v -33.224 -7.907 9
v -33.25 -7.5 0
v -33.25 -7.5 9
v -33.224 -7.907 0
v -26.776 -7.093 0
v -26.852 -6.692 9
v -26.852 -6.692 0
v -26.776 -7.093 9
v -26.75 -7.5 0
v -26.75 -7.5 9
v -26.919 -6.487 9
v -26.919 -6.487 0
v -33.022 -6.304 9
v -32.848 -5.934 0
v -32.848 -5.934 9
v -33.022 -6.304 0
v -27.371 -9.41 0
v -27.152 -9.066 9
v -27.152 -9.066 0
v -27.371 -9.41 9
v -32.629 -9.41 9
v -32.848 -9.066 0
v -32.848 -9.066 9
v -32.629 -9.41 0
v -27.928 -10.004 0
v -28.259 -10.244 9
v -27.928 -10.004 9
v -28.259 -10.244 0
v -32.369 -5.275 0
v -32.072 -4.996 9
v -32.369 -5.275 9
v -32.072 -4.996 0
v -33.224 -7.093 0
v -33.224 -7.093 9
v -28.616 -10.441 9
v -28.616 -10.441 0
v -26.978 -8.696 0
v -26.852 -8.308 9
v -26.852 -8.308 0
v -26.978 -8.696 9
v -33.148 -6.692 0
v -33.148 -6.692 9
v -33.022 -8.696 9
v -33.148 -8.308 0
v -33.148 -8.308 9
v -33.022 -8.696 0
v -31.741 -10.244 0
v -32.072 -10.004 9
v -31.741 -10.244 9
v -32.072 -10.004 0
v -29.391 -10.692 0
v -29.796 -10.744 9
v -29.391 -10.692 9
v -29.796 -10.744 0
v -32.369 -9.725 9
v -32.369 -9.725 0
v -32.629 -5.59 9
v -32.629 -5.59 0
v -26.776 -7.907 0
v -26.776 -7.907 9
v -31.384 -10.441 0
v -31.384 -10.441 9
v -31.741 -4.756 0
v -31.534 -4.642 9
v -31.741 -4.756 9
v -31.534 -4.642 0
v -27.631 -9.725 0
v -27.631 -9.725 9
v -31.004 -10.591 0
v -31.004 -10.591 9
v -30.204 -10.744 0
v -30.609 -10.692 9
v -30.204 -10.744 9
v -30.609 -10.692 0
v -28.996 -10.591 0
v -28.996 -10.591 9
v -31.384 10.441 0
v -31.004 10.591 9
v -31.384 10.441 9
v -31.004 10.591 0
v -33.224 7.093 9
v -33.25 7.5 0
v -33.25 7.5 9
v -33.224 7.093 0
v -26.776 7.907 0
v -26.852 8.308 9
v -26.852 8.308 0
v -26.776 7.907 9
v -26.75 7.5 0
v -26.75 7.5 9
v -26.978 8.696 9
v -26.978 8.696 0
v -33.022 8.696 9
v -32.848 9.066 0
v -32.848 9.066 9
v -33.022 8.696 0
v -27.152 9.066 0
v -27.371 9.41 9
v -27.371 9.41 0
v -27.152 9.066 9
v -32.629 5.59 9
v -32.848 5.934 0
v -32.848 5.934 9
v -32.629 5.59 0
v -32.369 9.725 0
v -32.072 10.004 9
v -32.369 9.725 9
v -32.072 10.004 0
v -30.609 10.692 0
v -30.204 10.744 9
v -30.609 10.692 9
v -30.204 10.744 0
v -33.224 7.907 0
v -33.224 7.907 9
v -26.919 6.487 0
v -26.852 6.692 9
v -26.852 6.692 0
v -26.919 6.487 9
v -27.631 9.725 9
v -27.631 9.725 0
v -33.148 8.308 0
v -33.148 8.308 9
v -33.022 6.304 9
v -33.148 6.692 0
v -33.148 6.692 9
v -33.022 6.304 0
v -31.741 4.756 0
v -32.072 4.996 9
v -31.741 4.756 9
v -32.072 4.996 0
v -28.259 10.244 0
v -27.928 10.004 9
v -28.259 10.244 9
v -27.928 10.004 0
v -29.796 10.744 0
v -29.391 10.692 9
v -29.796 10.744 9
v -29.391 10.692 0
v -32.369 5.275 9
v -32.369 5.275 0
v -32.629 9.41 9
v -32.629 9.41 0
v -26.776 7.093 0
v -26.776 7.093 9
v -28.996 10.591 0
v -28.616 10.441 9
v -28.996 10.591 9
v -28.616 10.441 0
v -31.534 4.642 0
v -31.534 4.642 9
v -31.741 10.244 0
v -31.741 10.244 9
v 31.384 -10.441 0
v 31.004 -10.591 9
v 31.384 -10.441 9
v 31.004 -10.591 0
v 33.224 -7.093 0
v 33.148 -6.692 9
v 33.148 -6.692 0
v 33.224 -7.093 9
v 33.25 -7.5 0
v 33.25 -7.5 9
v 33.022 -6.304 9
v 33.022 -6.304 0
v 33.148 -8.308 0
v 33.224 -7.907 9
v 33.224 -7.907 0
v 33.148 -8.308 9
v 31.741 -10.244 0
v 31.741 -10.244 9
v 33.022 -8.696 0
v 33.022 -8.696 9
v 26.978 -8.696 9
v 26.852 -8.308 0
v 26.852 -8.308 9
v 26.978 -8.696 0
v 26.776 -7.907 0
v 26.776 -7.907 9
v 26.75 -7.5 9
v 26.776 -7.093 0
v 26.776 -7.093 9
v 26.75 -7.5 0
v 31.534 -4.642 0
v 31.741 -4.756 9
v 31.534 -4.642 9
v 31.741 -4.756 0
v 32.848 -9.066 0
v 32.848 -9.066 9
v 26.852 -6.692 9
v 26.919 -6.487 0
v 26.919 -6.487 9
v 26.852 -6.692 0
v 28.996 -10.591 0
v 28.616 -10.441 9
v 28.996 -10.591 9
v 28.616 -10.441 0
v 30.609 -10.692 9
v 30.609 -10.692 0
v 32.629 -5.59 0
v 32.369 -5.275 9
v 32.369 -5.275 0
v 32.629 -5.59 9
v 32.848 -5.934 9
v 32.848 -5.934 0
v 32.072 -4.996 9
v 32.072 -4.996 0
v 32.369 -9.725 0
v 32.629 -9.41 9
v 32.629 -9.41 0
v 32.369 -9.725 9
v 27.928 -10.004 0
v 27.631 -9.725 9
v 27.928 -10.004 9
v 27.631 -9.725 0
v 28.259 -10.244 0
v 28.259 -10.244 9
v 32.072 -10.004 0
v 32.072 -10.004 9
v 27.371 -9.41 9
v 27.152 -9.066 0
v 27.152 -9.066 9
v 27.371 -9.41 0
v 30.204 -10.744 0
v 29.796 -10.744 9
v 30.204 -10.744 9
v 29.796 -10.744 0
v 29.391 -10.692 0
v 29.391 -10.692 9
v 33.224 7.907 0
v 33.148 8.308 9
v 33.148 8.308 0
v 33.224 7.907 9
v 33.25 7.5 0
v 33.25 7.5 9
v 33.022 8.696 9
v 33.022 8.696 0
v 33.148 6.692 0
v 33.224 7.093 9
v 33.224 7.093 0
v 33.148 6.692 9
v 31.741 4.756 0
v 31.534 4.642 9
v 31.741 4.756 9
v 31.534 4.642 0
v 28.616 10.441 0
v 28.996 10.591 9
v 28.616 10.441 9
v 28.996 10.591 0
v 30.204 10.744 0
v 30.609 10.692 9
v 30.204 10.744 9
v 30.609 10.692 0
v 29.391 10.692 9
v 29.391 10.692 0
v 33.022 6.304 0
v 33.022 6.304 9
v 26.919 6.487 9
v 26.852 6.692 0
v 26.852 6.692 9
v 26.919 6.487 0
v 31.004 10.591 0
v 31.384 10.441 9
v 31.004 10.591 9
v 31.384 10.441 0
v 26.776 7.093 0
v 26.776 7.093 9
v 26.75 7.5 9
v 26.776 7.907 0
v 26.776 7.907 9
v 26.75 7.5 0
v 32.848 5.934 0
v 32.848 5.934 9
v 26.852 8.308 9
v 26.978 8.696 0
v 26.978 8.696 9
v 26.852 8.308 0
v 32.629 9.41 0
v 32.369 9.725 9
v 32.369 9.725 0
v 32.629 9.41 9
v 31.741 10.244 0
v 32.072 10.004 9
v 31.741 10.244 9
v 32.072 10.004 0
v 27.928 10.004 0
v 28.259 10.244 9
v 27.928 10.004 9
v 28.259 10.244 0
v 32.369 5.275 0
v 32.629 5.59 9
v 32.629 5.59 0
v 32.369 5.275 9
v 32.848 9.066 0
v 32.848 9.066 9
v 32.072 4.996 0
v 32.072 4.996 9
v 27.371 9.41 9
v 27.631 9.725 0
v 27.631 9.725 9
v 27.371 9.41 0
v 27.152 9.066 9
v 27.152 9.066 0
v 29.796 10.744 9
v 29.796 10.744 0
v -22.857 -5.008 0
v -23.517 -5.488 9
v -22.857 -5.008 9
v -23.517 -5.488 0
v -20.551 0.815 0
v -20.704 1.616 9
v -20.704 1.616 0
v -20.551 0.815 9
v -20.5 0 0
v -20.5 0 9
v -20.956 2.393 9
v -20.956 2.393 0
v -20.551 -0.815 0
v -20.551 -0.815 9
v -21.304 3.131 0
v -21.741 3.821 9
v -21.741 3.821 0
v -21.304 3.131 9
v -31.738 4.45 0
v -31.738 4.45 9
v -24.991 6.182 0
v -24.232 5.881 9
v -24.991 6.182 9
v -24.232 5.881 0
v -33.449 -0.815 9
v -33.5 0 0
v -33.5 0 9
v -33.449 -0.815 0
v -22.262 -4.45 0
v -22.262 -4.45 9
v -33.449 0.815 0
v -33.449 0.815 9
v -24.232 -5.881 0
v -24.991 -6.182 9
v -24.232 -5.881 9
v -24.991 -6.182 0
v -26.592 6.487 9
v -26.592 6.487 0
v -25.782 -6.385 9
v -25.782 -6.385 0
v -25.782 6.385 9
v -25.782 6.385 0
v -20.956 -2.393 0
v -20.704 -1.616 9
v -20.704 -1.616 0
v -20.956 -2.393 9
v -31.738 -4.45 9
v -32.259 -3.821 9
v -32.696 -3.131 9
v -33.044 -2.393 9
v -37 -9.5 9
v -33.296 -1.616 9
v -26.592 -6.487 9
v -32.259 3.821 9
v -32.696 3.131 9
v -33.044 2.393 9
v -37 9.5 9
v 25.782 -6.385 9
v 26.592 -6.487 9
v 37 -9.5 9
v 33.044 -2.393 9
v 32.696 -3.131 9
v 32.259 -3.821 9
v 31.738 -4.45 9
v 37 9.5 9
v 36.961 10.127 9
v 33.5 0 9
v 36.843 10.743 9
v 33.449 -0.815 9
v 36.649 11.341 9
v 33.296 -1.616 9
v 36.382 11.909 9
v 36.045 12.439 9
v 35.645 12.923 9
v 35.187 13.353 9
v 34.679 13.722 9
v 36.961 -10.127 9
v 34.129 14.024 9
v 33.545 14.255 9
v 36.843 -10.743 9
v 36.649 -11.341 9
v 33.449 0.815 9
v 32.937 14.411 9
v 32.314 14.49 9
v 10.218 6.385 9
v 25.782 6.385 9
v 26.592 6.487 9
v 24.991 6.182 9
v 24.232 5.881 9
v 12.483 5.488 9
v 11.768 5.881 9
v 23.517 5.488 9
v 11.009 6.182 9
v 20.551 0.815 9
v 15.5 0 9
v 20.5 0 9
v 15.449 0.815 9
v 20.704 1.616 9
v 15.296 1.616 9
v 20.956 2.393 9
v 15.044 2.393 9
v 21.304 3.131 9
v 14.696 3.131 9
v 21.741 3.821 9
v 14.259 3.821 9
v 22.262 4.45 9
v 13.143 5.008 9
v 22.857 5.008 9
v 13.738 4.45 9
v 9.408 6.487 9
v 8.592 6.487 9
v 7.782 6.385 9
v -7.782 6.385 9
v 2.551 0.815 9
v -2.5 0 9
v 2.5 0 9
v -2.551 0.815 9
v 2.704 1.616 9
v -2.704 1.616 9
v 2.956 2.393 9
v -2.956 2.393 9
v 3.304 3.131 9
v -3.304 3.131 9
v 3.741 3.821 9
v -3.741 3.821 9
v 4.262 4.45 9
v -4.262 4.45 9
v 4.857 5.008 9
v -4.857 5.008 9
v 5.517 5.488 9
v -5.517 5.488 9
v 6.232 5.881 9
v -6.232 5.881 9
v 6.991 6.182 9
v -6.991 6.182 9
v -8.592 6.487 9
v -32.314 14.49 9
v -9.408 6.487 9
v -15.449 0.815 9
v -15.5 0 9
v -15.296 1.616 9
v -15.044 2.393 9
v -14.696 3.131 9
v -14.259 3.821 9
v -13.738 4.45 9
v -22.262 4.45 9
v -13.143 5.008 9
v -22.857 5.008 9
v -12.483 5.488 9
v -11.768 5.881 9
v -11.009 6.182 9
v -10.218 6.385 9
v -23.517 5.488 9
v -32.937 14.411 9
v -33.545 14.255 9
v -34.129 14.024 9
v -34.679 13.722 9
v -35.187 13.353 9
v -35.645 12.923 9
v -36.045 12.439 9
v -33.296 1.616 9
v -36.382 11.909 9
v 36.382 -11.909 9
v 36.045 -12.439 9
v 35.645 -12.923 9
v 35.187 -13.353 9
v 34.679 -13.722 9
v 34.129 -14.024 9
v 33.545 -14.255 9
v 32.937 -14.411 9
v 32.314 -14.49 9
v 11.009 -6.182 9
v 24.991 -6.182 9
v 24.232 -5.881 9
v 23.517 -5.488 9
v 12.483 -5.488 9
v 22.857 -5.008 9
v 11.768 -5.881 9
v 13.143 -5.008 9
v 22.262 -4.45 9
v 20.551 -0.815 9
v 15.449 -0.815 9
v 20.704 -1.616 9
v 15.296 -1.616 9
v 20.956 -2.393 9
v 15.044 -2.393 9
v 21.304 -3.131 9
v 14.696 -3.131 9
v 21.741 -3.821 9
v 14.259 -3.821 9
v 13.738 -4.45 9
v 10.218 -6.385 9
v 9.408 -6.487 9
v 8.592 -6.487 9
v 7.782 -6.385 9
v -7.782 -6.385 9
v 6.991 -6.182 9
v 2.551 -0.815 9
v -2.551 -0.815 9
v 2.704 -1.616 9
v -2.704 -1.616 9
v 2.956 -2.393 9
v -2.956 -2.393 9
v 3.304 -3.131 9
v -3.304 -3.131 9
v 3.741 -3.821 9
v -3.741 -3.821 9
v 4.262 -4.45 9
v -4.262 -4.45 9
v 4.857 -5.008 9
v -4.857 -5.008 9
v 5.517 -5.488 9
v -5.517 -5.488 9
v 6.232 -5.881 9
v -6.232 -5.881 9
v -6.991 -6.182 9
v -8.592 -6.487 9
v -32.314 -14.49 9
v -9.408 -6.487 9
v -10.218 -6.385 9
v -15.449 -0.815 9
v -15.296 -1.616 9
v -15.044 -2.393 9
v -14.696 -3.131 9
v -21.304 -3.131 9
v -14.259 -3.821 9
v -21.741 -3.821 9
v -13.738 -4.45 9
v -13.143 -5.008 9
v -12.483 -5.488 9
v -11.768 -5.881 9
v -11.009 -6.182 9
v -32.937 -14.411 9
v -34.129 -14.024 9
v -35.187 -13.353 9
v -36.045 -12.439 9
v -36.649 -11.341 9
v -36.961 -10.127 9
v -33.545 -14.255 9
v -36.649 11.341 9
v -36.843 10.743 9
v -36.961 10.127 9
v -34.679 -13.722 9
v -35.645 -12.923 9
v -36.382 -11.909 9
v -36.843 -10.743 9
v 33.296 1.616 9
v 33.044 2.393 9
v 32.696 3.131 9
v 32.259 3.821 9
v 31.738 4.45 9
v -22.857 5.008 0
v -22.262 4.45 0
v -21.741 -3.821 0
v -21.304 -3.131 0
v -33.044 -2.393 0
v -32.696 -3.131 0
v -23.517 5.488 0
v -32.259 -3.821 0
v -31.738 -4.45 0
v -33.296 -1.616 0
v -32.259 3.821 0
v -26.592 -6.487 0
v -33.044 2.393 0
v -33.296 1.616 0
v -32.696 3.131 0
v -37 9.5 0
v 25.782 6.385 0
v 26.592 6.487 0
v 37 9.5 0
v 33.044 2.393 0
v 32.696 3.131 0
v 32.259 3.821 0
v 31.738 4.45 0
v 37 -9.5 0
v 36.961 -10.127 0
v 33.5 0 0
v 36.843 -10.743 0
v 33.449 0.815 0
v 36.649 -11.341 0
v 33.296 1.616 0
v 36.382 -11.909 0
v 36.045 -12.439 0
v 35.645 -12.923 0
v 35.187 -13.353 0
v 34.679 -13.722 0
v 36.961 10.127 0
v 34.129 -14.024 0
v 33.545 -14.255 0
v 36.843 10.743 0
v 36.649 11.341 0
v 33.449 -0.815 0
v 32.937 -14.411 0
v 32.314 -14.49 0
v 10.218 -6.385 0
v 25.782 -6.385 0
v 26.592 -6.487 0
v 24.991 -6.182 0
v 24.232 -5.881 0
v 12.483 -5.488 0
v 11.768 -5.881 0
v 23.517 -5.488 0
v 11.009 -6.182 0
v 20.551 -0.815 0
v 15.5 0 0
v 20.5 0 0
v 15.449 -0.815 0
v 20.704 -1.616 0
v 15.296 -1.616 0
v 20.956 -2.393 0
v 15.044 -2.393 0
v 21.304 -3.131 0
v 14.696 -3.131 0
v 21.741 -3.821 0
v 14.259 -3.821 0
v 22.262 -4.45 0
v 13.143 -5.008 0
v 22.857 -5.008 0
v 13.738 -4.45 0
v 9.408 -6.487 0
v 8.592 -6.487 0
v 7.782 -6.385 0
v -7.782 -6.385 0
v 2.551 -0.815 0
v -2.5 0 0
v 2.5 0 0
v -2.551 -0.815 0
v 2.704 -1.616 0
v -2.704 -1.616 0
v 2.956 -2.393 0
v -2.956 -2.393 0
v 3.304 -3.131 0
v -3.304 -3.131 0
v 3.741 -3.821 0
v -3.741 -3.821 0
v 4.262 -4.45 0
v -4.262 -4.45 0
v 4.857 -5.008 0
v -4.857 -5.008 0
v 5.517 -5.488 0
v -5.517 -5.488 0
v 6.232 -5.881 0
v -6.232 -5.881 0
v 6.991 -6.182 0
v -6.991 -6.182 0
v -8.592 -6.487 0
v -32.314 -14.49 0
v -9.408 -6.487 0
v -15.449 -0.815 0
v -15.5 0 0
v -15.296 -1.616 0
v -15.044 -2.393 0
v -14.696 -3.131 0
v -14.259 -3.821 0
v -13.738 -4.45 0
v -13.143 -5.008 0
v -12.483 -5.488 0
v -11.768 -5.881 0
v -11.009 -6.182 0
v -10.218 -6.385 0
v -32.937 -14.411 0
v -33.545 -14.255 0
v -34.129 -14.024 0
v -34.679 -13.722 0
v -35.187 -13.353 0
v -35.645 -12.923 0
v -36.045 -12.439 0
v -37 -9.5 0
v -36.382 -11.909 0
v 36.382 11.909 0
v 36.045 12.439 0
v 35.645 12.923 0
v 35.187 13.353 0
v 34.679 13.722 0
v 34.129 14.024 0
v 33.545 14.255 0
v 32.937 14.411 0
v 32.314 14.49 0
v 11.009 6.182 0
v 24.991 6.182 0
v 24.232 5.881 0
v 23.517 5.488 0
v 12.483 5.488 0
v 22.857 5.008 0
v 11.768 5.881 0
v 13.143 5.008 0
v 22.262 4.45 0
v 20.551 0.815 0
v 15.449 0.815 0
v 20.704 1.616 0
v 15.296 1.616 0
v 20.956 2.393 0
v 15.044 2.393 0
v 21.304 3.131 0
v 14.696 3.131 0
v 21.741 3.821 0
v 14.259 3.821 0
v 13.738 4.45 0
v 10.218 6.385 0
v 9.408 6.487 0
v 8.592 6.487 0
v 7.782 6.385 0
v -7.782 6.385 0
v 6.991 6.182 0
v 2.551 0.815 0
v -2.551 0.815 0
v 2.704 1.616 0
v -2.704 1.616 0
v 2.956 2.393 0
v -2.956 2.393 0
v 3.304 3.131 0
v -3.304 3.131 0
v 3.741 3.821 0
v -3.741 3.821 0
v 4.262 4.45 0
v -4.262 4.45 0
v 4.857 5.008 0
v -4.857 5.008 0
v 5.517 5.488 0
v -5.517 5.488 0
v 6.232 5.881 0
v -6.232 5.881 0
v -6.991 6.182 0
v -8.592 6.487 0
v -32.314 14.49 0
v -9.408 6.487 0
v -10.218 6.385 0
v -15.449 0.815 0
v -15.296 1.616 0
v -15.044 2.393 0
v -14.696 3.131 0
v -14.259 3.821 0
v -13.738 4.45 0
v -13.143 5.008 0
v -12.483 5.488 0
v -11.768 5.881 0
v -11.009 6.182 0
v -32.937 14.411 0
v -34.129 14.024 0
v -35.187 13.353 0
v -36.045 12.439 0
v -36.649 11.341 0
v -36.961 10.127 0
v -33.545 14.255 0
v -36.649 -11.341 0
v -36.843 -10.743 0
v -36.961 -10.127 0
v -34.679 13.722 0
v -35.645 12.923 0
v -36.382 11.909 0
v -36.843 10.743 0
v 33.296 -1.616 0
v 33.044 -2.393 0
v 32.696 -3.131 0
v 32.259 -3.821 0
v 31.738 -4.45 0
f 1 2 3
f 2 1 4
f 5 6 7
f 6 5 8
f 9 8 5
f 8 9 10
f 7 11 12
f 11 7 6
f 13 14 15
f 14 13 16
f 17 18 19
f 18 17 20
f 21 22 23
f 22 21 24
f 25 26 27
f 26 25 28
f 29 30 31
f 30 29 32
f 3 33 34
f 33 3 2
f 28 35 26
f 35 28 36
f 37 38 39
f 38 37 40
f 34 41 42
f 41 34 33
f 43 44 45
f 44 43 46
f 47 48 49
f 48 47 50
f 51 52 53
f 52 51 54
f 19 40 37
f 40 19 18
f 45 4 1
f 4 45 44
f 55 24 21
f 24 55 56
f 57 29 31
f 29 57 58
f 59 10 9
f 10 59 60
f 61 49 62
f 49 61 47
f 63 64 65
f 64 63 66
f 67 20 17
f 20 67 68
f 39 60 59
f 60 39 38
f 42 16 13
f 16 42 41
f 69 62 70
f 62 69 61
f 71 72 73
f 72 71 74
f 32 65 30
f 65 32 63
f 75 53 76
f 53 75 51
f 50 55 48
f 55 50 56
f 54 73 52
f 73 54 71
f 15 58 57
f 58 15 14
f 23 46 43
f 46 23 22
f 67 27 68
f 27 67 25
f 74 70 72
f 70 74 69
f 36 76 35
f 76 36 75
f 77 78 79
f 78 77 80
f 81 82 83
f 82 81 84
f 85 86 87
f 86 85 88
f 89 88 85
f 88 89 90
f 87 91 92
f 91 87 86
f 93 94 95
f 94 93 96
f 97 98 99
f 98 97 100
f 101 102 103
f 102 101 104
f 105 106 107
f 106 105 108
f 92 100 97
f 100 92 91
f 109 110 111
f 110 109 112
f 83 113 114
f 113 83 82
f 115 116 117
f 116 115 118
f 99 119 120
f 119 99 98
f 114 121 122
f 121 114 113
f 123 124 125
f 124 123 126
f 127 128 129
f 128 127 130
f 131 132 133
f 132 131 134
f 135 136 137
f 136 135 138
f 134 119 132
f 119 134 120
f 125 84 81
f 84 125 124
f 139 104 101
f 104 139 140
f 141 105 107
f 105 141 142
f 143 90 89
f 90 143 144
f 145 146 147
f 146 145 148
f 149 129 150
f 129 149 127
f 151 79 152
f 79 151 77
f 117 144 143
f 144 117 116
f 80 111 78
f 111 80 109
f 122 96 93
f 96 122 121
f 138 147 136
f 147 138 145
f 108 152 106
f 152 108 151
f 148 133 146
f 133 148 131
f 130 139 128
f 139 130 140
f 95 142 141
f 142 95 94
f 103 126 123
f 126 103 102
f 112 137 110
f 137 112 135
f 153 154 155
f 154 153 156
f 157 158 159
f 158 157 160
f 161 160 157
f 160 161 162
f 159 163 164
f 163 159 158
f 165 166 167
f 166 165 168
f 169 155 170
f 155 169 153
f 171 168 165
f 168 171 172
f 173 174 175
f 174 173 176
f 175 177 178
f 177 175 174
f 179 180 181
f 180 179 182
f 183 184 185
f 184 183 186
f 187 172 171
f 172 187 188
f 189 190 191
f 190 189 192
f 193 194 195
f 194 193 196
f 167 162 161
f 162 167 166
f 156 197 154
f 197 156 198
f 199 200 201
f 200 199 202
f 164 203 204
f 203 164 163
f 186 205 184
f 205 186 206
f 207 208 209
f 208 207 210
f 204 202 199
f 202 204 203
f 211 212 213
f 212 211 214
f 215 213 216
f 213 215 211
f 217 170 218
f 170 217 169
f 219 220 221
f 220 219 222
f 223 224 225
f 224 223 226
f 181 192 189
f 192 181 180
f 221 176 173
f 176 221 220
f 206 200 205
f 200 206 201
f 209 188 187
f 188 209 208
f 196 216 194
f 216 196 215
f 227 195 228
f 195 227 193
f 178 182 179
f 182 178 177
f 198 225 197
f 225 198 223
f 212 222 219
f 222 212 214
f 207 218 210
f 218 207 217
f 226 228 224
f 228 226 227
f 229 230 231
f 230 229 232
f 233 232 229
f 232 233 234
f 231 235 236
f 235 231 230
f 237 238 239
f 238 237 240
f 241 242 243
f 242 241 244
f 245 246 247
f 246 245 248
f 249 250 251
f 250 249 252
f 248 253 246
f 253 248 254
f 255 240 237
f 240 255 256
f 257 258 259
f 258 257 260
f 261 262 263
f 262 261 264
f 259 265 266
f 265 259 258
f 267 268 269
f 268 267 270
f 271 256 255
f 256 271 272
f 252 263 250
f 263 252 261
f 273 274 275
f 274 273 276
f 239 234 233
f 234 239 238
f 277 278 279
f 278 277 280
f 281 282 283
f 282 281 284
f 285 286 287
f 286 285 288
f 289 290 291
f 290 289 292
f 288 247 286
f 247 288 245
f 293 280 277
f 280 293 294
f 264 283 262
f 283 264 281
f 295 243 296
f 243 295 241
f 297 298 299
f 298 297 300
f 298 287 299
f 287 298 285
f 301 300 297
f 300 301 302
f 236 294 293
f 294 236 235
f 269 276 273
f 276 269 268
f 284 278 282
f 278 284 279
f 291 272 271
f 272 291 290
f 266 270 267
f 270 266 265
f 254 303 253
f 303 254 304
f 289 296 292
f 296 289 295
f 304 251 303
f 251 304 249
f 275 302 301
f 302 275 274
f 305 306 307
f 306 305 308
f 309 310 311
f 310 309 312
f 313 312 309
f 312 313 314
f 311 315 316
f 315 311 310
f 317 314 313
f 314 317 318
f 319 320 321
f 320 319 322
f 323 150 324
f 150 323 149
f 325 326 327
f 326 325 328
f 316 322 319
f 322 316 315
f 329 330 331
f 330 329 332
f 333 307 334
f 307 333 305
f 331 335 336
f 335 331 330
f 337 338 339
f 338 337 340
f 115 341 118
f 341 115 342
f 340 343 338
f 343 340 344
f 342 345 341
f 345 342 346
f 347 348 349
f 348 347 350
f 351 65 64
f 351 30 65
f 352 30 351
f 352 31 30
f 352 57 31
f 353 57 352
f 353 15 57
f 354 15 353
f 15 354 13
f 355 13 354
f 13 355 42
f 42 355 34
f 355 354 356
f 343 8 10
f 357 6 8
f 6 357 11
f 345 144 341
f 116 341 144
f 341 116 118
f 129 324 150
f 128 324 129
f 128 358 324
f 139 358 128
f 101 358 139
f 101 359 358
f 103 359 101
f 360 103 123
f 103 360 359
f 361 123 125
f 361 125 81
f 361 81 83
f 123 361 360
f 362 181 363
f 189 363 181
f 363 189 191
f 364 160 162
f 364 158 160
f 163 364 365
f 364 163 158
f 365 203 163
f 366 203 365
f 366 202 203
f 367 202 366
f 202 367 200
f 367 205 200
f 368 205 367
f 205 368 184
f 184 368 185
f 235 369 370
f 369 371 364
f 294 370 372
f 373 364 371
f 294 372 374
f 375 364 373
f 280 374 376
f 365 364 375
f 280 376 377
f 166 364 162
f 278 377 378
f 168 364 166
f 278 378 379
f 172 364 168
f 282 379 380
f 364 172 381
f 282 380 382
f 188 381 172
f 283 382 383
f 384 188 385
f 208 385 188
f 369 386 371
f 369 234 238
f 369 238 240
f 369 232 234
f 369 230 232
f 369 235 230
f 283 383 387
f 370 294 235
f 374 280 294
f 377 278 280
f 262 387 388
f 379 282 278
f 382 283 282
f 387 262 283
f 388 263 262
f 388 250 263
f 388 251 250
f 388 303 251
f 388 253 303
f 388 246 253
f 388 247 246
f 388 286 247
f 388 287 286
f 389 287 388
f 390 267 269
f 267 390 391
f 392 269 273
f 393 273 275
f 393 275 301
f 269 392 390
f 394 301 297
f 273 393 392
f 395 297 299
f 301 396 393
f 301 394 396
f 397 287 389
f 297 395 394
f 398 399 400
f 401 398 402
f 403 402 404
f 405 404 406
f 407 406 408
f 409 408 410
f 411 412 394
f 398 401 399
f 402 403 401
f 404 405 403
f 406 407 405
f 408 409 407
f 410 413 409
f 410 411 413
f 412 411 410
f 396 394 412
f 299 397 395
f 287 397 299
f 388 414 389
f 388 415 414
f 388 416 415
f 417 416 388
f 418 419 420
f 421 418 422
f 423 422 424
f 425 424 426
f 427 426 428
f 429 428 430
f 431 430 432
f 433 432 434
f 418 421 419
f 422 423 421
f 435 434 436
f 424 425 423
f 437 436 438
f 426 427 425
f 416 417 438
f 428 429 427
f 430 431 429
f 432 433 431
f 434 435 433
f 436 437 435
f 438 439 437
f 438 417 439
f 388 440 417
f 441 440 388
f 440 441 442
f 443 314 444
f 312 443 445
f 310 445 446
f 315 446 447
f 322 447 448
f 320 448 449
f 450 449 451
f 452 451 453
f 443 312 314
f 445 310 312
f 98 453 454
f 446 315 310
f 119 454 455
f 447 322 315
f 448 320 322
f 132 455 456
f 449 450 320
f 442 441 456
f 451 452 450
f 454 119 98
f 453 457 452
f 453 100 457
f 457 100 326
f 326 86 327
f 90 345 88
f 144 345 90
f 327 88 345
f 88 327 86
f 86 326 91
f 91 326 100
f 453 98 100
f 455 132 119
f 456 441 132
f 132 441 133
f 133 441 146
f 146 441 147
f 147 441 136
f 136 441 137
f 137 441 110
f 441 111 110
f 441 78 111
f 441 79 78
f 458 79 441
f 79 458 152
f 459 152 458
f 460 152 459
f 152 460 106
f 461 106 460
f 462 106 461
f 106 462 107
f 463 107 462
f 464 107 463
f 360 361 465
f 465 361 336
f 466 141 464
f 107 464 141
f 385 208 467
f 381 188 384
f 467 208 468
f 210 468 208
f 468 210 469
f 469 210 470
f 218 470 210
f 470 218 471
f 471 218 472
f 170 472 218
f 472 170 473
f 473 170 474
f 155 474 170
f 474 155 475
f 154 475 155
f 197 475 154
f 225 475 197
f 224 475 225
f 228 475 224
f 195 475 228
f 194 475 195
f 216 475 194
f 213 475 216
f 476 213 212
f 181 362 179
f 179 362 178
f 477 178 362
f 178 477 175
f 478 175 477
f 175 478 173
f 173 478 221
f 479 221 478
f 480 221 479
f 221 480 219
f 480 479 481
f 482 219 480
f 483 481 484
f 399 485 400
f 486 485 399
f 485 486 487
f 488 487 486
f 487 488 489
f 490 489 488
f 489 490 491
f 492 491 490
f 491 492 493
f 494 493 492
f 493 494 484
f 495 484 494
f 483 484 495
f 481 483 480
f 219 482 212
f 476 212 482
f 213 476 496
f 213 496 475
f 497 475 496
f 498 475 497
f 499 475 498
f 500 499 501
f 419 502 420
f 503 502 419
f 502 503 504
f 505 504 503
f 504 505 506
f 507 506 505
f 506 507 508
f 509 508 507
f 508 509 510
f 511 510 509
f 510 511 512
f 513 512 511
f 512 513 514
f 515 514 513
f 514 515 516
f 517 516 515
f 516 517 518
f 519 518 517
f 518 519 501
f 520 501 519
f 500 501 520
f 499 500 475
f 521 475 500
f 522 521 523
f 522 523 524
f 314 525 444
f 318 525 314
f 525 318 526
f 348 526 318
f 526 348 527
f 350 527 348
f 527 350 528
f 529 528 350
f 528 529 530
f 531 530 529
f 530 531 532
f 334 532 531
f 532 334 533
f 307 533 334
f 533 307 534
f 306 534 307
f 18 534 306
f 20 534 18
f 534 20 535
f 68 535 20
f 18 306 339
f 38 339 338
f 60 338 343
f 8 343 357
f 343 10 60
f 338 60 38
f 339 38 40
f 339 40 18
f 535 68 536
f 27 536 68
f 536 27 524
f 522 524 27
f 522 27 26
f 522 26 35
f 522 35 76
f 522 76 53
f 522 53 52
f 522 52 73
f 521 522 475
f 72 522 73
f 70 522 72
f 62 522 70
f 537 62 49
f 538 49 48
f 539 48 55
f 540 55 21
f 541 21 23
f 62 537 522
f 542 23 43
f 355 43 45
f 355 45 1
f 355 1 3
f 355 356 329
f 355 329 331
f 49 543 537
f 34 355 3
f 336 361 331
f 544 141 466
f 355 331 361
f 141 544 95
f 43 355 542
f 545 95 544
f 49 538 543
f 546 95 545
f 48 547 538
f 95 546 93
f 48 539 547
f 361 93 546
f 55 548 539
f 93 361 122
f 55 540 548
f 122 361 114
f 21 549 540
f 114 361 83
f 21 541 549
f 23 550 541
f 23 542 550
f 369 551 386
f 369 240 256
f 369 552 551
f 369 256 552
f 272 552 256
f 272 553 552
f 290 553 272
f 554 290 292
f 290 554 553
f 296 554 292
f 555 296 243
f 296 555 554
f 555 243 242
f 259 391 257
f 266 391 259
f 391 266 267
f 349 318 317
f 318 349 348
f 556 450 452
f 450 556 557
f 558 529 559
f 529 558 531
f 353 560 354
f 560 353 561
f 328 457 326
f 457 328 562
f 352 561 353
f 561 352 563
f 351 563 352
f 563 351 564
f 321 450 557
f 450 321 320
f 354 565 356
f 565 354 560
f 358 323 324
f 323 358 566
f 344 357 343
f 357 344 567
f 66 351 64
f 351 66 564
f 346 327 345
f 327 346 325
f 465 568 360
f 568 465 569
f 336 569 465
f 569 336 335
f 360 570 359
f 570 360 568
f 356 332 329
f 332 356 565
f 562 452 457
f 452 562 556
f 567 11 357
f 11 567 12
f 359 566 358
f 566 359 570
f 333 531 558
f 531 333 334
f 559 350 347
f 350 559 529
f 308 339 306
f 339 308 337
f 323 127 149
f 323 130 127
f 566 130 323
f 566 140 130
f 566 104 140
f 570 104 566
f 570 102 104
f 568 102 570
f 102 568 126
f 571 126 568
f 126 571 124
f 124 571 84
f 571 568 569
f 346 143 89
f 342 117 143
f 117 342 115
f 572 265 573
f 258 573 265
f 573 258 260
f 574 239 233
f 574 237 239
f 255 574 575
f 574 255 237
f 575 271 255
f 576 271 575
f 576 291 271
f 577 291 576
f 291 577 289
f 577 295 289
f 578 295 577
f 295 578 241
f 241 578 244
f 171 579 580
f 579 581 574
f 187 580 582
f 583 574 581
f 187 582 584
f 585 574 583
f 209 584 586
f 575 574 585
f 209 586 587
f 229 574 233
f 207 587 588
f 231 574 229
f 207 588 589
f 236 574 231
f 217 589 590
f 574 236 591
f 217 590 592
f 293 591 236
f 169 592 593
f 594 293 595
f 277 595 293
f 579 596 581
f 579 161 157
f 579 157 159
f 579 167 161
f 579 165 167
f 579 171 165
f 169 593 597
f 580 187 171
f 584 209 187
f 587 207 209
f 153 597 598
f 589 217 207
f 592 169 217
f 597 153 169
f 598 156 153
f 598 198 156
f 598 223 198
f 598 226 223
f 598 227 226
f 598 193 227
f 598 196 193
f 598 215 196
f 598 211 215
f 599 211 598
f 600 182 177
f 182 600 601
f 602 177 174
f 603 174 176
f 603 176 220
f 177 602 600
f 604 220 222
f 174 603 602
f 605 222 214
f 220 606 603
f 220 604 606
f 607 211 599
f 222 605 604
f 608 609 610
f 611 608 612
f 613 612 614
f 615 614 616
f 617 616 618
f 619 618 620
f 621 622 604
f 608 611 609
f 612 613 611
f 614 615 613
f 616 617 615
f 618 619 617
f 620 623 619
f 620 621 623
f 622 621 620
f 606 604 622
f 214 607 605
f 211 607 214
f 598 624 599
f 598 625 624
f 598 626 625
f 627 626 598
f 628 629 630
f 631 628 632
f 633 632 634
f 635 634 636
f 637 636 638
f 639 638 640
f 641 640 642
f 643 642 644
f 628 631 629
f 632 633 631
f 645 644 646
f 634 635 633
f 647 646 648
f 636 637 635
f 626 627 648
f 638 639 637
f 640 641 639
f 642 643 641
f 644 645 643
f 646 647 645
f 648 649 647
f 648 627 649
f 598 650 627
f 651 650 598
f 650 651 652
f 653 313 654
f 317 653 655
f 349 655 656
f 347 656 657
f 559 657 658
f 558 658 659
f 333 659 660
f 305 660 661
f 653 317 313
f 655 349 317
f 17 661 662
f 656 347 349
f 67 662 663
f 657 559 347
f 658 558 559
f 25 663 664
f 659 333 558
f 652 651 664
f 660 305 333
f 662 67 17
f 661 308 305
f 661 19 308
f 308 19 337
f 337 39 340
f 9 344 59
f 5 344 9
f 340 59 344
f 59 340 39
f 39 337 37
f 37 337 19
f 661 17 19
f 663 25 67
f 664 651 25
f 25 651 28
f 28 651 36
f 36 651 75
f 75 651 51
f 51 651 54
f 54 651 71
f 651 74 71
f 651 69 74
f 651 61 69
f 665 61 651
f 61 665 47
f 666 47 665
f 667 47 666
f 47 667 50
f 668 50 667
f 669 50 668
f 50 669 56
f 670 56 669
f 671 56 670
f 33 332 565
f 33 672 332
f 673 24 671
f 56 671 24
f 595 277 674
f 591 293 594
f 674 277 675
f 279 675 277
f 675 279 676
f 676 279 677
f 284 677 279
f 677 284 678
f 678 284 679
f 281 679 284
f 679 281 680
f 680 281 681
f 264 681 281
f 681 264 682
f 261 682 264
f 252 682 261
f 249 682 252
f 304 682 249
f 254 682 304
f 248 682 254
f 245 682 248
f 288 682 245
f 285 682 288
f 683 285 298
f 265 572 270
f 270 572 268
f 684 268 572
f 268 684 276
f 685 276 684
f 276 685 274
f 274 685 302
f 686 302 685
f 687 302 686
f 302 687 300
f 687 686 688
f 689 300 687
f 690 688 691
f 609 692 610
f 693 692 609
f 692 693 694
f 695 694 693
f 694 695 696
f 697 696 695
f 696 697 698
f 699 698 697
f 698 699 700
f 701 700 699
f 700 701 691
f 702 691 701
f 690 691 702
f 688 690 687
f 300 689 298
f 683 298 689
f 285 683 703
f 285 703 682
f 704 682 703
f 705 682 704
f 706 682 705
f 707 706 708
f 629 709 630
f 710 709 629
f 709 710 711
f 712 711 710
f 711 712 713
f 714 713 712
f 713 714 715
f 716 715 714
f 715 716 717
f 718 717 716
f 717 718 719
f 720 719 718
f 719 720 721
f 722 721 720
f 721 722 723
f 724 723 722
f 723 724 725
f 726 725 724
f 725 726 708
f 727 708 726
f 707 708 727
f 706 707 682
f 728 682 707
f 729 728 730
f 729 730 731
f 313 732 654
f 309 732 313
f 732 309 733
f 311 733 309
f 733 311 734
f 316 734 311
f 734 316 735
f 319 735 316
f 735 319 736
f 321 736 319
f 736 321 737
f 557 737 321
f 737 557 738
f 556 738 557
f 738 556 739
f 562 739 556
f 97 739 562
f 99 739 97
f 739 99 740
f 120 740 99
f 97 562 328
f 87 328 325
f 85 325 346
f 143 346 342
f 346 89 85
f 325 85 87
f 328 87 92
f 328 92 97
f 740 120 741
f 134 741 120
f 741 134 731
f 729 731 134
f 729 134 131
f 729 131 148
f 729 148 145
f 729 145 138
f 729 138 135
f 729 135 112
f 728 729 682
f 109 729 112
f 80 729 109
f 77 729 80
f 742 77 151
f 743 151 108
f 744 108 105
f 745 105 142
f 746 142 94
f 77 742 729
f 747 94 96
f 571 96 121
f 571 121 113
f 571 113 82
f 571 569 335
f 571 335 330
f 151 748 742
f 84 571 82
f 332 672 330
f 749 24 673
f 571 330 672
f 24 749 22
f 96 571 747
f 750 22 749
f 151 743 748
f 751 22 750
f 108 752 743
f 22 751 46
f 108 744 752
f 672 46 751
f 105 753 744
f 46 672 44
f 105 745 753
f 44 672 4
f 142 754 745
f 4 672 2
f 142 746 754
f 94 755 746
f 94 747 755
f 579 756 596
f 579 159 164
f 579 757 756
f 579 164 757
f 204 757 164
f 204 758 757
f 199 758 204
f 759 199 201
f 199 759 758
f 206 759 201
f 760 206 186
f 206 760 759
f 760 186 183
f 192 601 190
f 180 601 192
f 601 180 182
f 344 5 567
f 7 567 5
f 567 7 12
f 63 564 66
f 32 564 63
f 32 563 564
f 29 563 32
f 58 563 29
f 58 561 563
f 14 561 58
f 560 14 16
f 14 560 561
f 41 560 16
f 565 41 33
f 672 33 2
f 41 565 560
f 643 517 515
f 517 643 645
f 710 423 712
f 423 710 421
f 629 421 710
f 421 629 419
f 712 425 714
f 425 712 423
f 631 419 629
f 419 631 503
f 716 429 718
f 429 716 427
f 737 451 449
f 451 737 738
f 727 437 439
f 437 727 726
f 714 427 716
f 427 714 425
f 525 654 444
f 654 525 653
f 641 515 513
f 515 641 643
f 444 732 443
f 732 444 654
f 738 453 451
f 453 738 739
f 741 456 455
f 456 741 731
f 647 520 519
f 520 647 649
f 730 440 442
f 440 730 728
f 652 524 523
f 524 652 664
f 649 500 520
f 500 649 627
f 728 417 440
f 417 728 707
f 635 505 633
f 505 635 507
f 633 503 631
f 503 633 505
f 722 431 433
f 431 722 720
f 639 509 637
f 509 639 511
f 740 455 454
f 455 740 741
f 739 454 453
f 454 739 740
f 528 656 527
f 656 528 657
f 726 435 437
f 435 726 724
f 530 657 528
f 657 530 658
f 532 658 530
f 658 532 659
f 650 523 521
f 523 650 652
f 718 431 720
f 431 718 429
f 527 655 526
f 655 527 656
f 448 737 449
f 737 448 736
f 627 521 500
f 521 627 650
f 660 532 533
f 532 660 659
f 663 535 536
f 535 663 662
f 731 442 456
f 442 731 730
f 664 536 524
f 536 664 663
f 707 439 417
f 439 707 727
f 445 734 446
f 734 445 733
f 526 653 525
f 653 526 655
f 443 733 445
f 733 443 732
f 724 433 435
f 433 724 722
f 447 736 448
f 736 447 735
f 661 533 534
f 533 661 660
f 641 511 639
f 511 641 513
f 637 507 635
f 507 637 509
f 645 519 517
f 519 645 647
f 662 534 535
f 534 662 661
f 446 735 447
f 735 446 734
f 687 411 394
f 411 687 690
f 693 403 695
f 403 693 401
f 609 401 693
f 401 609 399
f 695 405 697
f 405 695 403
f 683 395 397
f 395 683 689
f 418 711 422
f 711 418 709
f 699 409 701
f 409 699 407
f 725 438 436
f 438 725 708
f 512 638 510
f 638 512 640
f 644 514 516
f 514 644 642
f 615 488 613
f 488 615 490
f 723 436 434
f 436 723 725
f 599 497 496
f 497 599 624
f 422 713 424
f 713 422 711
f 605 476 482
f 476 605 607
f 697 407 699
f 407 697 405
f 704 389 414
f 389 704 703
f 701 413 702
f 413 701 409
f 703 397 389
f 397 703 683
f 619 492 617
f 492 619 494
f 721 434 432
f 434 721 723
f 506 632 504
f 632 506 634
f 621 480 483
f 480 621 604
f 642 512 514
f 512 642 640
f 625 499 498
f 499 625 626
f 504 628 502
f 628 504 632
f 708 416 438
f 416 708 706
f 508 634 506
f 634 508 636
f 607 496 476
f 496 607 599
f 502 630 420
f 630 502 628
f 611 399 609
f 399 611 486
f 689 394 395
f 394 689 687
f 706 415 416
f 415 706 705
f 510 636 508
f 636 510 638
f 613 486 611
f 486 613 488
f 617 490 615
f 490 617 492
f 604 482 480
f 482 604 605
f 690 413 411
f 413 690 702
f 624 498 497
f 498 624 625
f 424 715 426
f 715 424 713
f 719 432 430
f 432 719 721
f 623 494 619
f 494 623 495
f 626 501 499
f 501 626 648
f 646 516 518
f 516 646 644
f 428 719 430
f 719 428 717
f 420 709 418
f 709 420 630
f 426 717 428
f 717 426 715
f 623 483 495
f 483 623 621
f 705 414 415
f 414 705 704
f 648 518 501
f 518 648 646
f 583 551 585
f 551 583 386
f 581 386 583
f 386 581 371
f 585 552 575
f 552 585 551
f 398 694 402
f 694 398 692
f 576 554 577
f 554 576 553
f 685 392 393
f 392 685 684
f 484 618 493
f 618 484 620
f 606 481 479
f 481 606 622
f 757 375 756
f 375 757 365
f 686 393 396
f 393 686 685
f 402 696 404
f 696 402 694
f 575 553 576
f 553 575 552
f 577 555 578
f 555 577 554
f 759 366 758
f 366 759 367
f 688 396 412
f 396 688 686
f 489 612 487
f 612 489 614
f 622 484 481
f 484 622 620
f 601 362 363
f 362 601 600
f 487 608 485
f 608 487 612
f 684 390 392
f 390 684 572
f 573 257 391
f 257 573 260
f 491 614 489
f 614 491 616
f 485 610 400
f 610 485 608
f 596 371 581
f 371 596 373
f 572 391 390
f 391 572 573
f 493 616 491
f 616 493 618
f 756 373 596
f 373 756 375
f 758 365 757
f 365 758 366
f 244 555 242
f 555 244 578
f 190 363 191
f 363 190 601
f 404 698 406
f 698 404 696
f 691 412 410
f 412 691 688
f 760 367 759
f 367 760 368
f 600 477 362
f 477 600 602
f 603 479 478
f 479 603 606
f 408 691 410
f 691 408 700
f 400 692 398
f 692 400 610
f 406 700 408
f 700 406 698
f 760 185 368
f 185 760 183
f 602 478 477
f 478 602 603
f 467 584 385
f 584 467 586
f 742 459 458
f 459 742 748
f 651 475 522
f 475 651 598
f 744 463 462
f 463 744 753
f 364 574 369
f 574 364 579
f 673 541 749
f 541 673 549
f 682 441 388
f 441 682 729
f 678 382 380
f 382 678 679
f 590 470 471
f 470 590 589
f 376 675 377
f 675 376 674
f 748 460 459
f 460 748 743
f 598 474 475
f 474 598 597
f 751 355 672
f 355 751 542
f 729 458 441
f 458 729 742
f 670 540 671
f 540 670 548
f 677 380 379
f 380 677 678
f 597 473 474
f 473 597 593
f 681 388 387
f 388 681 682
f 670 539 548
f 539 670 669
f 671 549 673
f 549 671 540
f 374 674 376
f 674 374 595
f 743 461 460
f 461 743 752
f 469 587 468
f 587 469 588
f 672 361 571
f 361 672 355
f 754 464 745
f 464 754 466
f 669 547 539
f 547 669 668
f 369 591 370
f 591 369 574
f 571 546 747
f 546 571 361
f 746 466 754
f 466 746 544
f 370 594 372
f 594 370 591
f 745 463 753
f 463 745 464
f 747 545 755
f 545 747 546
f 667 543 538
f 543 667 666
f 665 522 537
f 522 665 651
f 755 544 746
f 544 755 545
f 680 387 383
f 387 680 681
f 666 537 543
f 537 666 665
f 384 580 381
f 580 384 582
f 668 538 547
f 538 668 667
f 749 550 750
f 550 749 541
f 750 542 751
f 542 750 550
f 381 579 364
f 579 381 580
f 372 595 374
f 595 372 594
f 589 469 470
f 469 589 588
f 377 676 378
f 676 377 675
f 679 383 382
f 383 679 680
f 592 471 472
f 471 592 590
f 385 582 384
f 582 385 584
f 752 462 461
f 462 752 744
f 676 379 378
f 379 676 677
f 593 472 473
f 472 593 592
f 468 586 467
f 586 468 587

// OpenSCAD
$fn = 50;

difference() {
	union() {
		hull() {
			translate(v = [-32.0, 9.5, 0]) {
				cylinder(h = 9, r = 5);
			}
			translate(v = [32.0, 9.5, 0]) {
				cylinder(h = 9, r = 5);
			}
			translate(v = [-32.0, -9.5, 0]) {
				cylinder(h = 9, r = 5);
			}
			translate(v = [32.0, -9.5, 0]) {
				cylinder(h = 9, r = 5);
			}
		}
	}
	union() {
		translate(v = [-30.0, -7.5, -100.0]) {
			cylinder(h = 200, r = 3.25);
		}
		translate(v = [-30.0, 7.5, -100.0]) {
			cylinder(h = 200, r = 3.25);
		}
		translate(v = [30.0, -7.5, -100.0]) {
			cylinder(h = 200, r = 3.25);
		}
		translate(v = [30.0, 7.5, -100.0]) {
			cylinder(h = 200, r = 3.25);
		}
		translate(v = [-30.0, -7.5, -100.0]) {
			cylinder(h = 200, r = 1.8);
		}
		translate(v = [-30.0, 7.5, -100.0]) {
			cylinder(h = 200, r = 1.8);
		}
		translate(v = [30.0, -7.5, -100.0]) {
			cylinder(h = 200, r = 1.8);
		}
		translate(v = [30.0, 7.5, -100.0]) {
			cylinder(h = 200, r = 1.8);
		}
		translate(v = [-27.0, 0, 0.0]) {
			cylinder(h = 9, r = 6.5);
		}
		translate(v = [-9.0, 0, 0.0]) {
			cylinder(h = 9, r = 6.5);
		}
		translate(v = [9.0, 0, 0.0]) {
			cylinder(h = 9, r = 6.5);
		}
		translate(v = [27.0, 0, 0.0]) {
			cylinder(h = 9, r = 6.5);
		}
	}
}
